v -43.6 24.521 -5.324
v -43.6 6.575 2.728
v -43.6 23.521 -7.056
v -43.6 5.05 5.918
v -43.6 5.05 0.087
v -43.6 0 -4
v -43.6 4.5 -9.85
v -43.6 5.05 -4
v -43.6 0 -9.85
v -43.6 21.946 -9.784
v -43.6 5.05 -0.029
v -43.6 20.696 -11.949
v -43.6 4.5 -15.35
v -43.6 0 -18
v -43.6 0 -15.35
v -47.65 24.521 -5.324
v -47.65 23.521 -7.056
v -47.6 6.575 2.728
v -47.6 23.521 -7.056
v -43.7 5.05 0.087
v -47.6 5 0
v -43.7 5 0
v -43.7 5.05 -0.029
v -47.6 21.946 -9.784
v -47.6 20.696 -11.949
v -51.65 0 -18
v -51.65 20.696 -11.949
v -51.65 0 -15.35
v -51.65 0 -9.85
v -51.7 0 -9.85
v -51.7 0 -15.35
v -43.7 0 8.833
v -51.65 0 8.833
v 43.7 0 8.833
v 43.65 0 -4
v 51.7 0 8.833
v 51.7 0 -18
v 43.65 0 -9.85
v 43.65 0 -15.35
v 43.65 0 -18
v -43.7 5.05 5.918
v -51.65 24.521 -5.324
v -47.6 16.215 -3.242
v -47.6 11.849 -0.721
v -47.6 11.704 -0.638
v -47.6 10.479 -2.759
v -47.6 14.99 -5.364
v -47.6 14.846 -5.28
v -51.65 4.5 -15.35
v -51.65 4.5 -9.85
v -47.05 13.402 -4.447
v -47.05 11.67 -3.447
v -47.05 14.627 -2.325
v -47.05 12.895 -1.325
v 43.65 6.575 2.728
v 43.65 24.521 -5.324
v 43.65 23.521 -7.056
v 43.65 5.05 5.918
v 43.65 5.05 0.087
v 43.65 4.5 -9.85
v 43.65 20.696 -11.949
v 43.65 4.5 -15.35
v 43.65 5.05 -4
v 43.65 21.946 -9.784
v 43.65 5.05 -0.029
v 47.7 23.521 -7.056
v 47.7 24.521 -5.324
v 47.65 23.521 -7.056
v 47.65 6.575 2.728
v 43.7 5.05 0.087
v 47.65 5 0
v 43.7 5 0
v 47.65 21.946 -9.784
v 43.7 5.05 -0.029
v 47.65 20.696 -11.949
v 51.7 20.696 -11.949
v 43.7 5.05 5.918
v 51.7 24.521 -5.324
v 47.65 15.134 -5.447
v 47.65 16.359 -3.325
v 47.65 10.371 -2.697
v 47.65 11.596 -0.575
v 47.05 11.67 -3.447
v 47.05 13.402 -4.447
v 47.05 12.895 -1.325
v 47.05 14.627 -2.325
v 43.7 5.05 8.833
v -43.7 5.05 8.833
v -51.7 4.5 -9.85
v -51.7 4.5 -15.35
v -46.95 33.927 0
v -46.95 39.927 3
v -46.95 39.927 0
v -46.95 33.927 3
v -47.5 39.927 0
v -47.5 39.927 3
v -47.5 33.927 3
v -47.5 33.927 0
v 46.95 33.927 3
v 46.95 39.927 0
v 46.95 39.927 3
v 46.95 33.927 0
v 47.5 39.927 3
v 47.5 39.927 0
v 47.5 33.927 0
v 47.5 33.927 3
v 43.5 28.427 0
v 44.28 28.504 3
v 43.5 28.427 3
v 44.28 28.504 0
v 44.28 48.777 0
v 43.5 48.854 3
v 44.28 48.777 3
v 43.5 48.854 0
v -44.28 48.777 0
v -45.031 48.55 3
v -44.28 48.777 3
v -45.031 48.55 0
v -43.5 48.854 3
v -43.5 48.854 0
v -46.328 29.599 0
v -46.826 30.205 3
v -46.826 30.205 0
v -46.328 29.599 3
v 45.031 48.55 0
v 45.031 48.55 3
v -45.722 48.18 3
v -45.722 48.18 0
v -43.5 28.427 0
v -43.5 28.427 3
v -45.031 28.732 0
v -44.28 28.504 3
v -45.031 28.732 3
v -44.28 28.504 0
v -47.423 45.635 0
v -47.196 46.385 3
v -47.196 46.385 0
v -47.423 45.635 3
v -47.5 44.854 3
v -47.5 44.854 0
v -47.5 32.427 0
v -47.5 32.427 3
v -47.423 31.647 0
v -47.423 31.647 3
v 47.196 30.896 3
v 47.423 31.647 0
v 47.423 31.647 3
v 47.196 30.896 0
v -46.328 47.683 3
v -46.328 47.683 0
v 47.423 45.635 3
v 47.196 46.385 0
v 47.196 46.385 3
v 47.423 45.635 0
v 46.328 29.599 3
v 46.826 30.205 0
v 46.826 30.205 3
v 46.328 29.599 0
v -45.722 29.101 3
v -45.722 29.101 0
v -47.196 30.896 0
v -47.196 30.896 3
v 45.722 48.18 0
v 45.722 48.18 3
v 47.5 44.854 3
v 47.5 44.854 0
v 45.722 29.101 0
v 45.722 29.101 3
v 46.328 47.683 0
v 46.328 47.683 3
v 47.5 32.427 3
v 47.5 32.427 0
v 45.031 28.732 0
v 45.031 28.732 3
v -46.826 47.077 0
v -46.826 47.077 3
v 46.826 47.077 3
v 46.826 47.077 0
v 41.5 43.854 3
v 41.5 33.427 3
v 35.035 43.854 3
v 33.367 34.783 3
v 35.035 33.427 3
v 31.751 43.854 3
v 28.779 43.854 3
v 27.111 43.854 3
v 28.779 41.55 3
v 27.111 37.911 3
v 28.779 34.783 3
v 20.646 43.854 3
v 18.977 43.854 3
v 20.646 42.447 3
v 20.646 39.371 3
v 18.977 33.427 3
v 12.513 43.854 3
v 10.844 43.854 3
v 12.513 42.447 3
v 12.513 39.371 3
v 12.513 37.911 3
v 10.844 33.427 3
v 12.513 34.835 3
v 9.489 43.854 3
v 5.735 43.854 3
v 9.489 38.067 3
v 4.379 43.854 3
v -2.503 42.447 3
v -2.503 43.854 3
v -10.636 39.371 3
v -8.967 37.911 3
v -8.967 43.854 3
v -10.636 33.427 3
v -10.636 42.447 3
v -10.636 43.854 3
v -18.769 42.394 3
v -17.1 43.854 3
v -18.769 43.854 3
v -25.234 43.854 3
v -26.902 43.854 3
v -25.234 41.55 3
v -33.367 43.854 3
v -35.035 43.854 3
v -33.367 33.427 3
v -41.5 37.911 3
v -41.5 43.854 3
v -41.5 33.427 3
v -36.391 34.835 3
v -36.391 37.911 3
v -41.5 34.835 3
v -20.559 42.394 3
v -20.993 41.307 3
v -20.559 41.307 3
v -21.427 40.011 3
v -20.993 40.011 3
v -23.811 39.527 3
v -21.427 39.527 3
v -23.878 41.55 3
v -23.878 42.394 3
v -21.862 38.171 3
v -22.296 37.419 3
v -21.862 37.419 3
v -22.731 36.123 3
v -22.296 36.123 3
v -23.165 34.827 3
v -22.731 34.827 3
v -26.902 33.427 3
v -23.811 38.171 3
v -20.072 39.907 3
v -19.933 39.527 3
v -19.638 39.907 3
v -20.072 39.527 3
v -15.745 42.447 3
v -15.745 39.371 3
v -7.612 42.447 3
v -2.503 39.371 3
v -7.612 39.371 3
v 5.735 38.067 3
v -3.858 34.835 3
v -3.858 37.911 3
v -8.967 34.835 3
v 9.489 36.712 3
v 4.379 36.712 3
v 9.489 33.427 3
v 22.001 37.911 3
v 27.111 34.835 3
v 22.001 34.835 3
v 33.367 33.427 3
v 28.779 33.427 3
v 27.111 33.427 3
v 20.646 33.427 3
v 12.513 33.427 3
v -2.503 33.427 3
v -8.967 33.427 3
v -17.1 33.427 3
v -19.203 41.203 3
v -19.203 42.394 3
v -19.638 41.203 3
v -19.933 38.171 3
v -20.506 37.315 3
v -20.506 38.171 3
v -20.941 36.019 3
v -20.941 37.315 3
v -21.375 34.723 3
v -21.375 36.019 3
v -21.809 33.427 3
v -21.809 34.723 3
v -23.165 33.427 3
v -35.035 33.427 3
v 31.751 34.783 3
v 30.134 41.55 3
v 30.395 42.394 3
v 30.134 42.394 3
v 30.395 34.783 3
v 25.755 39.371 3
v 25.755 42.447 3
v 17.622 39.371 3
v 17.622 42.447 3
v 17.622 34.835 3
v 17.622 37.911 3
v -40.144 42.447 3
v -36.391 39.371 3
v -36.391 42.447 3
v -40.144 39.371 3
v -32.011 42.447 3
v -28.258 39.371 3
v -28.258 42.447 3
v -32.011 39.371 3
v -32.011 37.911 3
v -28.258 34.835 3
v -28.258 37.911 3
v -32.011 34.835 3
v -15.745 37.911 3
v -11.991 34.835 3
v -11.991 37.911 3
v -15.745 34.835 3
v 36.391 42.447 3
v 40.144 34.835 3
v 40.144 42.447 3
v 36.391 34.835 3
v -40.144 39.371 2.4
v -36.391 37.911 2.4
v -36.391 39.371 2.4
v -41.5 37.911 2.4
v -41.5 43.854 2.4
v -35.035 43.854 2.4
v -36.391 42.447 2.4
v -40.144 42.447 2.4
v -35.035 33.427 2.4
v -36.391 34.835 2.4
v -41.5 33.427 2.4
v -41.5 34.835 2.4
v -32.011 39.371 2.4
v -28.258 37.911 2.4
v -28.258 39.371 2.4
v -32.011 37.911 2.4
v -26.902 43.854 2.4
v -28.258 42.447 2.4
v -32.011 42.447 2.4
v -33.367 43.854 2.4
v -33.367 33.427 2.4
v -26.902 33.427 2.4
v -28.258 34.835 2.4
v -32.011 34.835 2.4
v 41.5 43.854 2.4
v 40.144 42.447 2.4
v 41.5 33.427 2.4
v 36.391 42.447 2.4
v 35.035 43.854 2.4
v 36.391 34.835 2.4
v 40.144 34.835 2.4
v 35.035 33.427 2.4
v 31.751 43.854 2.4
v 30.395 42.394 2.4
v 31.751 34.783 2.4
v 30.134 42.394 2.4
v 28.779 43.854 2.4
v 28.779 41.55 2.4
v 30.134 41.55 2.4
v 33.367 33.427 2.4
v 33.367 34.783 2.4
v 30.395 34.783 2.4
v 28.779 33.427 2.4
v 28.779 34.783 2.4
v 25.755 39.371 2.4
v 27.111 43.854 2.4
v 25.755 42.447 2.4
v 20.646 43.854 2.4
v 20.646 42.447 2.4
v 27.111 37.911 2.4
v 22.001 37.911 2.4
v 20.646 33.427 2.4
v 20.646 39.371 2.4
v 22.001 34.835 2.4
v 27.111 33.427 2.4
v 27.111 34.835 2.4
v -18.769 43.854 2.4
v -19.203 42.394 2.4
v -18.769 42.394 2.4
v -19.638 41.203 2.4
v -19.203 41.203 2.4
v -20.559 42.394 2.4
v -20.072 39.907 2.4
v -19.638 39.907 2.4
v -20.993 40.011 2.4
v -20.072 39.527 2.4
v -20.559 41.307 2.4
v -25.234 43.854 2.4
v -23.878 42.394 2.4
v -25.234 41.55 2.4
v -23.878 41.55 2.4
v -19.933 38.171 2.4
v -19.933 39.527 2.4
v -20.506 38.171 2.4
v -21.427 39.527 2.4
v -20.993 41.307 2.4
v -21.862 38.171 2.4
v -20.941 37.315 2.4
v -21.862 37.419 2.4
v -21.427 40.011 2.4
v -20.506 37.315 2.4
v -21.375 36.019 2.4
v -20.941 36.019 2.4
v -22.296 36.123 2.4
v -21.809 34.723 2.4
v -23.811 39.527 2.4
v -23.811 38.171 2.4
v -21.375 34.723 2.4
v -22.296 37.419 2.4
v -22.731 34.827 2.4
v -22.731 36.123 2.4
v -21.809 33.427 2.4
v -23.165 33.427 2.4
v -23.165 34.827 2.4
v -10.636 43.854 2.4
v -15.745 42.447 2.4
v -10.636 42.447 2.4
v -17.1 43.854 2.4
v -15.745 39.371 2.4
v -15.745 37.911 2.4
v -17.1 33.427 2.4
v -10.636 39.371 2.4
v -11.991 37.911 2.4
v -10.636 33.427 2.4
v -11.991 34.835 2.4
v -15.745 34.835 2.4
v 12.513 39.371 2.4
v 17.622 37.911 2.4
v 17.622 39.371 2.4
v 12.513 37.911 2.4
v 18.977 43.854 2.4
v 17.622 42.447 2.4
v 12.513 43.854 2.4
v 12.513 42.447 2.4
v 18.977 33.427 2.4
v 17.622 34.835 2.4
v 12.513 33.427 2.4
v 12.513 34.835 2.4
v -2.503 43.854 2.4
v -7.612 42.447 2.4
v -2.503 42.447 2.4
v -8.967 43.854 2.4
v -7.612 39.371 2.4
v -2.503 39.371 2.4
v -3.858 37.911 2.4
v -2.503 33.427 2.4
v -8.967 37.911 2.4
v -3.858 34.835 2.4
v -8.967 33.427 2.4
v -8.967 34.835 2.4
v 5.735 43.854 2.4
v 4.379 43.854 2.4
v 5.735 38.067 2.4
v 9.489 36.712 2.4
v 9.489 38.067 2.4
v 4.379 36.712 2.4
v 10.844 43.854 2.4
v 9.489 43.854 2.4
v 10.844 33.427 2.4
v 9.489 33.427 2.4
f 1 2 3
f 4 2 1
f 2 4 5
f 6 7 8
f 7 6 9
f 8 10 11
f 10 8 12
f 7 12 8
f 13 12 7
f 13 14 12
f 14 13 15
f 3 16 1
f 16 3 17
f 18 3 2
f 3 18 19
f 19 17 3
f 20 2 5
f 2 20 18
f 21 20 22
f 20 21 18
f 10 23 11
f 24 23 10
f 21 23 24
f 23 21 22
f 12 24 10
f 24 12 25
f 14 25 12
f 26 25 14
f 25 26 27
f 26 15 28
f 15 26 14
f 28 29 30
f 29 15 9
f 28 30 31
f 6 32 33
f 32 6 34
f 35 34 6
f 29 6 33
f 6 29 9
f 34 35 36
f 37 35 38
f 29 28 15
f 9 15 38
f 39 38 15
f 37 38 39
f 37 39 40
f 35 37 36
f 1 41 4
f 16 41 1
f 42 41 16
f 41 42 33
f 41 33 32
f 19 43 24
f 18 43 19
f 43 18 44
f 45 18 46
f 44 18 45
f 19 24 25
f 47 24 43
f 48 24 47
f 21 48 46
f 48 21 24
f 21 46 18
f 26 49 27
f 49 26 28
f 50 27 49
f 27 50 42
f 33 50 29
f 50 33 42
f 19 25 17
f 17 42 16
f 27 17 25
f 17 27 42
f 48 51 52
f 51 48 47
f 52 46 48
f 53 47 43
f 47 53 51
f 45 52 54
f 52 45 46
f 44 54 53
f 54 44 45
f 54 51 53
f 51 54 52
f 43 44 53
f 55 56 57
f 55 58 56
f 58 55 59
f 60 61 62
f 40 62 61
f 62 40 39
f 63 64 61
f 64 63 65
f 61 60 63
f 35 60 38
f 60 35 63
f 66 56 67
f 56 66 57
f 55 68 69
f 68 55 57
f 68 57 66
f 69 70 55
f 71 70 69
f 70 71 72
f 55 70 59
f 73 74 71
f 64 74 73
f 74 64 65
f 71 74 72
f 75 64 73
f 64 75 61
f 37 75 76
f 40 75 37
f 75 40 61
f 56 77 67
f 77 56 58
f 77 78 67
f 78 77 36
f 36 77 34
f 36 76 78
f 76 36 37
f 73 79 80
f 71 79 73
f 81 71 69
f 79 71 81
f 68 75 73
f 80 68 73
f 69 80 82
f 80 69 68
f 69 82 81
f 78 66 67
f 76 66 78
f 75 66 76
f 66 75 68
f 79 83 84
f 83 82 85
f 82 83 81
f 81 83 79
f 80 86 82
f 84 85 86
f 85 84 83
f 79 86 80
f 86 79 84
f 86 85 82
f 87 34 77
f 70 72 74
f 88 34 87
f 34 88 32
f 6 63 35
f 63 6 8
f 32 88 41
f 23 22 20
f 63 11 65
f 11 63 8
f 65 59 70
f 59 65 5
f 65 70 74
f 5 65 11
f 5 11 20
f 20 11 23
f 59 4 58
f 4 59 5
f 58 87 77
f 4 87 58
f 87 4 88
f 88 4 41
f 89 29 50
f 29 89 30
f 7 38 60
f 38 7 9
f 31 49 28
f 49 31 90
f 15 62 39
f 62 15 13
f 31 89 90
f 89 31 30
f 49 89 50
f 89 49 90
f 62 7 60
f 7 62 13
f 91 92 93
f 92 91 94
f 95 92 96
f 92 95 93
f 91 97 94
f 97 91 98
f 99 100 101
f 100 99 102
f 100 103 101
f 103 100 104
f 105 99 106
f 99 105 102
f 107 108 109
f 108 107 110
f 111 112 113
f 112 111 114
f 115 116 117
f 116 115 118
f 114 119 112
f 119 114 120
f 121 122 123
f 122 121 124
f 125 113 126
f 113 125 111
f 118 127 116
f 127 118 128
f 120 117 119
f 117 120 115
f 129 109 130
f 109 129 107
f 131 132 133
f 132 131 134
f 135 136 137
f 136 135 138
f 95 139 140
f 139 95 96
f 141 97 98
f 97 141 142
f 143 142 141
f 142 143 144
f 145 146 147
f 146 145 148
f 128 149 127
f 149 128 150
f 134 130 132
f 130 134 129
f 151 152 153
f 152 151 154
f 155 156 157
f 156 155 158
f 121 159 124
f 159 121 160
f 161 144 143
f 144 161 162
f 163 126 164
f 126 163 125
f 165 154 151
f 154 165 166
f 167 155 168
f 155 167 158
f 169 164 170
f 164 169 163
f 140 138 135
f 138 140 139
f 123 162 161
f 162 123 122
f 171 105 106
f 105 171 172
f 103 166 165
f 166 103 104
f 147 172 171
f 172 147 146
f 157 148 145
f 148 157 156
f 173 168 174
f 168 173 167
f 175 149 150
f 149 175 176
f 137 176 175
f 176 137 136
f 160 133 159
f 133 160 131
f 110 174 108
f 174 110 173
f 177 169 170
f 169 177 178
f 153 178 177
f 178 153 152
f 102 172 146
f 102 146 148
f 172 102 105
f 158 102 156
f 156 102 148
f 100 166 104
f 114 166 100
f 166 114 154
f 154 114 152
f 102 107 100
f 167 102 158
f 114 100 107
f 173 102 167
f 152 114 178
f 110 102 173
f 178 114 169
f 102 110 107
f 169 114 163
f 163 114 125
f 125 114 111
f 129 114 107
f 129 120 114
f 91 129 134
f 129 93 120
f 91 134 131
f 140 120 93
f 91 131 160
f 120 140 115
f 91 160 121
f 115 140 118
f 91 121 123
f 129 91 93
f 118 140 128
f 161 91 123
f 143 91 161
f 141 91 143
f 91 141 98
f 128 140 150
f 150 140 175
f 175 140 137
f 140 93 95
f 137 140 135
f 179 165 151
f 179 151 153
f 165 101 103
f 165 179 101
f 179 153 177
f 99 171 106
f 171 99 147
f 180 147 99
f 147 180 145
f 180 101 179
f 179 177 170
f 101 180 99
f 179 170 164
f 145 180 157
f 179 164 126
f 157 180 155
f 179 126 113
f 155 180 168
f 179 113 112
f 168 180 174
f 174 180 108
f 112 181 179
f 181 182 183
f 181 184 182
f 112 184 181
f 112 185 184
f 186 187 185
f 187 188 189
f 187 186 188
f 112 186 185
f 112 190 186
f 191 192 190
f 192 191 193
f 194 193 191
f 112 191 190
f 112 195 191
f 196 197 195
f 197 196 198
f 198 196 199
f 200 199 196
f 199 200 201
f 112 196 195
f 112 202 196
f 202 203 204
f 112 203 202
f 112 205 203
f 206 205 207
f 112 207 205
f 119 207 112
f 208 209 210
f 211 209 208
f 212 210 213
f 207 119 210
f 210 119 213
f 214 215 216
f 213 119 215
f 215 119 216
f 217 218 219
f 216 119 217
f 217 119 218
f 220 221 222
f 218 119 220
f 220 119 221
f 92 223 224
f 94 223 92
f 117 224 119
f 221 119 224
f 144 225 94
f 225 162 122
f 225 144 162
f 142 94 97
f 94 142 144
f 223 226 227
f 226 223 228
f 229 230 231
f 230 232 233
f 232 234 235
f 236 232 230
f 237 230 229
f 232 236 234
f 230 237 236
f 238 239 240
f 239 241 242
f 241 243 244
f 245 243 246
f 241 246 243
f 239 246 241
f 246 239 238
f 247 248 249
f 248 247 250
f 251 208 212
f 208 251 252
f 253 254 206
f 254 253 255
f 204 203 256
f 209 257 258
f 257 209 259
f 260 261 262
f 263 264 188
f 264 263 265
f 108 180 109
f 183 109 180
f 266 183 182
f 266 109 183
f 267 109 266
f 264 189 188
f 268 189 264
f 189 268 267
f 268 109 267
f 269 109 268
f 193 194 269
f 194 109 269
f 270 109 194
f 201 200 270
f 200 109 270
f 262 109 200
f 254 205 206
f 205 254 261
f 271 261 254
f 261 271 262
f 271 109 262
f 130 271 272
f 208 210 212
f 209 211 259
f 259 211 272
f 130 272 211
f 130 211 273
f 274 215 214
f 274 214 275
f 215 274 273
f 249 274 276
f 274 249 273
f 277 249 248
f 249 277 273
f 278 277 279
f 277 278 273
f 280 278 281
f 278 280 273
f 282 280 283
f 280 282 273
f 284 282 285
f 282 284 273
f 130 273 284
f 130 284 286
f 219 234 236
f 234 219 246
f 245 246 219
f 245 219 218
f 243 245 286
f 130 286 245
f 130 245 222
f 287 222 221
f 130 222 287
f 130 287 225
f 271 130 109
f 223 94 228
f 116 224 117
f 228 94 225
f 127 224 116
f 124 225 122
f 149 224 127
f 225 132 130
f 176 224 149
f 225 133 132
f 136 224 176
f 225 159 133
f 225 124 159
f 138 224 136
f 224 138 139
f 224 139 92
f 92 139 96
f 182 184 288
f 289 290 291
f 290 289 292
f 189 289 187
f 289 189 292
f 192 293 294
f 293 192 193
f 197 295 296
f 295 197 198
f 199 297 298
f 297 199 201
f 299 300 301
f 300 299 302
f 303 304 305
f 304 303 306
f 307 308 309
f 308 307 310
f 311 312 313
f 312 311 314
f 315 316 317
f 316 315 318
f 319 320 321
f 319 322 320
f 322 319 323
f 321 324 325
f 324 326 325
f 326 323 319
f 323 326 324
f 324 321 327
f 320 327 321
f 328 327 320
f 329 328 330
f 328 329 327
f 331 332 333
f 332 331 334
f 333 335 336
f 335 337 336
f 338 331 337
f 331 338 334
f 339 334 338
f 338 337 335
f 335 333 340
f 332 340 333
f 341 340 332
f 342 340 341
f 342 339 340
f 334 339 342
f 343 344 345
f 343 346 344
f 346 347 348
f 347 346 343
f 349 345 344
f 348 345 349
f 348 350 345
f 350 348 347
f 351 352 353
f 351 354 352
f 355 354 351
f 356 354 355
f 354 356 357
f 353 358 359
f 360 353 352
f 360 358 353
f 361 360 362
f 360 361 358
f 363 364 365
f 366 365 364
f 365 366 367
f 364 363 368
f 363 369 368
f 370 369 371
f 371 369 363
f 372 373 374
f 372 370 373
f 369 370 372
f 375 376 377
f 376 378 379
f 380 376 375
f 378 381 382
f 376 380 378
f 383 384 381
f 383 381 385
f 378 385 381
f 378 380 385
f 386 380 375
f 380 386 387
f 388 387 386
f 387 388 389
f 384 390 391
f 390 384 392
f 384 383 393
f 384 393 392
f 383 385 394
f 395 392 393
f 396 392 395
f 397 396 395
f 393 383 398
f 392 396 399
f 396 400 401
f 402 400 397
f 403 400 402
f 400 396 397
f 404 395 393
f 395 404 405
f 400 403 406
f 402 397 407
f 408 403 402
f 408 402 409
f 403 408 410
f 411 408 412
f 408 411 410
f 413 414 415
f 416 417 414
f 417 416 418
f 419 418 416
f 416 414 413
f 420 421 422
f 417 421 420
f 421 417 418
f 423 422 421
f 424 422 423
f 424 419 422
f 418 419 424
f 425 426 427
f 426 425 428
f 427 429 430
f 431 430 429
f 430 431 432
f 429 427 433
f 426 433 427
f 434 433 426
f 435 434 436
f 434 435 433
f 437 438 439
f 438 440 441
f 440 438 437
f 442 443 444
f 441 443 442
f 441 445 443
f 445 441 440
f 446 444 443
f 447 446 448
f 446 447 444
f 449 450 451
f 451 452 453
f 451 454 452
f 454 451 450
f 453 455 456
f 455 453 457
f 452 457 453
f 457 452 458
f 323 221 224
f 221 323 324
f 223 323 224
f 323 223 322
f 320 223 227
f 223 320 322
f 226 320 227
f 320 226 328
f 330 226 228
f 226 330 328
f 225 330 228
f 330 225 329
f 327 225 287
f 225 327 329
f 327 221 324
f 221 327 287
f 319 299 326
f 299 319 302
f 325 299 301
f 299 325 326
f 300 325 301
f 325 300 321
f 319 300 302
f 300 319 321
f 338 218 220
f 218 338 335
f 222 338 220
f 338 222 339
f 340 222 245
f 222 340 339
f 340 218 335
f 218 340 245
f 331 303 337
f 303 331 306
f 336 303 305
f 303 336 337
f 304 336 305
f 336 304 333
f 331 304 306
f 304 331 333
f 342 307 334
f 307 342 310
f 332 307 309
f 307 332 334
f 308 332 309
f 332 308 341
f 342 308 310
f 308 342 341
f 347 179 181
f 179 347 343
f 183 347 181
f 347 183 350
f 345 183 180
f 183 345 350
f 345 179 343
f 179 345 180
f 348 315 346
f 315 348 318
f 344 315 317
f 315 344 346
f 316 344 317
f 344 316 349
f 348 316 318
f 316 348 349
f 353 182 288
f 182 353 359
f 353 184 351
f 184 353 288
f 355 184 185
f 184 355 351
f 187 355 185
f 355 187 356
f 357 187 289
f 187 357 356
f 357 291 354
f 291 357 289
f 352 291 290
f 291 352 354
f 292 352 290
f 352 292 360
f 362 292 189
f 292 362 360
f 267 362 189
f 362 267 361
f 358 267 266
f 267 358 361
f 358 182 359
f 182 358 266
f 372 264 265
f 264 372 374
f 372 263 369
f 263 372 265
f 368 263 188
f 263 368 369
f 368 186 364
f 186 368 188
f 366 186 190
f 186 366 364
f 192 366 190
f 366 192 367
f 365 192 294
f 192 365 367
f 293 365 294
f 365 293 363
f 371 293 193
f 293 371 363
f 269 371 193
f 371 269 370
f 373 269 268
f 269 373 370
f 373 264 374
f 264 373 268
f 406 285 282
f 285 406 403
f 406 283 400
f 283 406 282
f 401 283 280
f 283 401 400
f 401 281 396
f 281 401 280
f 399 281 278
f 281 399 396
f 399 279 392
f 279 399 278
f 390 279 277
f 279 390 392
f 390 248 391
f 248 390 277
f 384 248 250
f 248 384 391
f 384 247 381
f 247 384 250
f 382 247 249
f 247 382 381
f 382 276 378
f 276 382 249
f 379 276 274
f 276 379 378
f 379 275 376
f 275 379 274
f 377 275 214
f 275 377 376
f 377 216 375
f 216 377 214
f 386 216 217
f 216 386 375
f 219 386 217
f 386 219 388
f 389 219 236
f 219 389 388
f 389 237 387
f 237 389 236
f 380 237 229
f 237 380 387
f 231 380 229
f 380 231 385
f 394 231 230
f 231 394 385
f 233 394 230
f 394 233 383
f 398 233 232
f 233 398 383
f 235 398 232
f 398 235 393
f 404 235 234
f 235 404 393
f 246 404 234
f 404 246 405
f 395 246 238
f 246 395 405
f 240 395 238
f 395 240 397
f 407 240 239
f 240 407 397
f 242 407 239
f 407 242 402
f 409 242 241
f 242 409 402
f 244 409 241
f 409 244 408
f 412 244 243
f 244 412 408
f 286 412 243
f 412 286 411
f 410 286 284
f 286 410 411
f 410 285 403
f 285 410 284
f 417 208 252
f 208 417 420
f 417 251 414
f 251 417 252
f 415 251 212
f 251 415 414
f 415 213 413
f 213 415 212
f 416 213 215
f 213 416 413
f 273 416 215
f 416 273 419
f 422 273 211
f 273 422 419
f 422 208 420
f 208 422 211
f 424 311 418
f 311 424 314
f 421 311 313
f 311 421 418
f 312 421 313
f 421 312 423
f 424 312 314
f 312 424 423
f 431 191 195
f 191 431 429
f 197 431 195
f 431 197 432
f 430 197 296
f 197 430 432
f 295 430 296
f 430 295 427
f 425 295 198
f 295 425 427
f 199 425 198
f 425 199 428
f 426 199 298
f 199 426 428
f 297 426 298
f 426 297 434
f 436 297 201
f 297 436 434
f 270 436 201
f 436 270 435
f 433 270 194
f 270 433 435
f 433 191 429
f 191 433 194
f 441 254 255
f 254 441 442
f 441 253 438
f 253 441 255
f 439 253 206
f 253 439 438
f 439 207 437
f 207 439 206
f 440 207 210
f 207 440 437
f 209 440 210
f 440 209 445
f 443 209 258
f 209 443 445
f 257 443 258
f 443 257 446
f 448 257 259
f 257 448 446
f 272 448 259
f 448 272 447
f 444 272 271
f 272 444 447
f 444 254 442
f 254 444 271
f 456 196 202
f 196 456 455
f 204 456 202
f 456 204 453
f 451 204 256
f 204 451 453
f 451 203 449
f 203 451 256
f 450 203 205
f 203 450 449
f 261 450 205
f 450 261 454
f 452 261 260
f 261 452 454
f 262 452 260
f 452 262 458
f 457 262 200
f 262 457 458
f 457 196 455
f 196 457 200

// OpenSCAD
// =============================================================================
//  Plate Forge — car parking number plate
//  Single colour, single sided, engraved digits, single-piece grooved wedge stand.
//  Tuned for a Bambu Lab A1 mini (180 × 180 × 180).
//
//  MakerWorld Parametric Model Maker ready:
//    · Customizer-style top level parameters with dropdowns
//    · mw_plate_1() for the printable output
//    · mw_assembly_view() for the assembled preview
//
//  Print the panel back-face-down, number face up, ironing ON ("All top
//  surfaces"). Print the stand standing on its base — no supports either way.
// =============================================================================

/* [The number] */

// Digits, space, + - . only. Up to 14 characters.
number = "98765 43210";

// What to generate on the plate
mode = "both"; // [both:Panel + stand, panel:Panel only, rack:Stand only, coupon:Pen test coupon]

/* [Panel] */

// Target length of the plate in mm (70-100 mm is sweet spot for car dashboards)
plate_length = 95; // [60:5:160]

panel_thickness = 3.0; // [1.6:0.2:4.5]
corner_radius = 4; // [0:0.5:14]
side_gap = 6; // [2:1:26]
end_gap = 5; // [2:1:22]

/* [Digit relief] */

// Engraved = pen sits in the groove. Raised = wipe a pen across the tops.
lettering = "engraved"; // [engraved:Engraved, raised:Raised]

// How deep the groove is / how high the ridge is
relief_depth = 0.6; // [0.3:0.1:1.2]

// Maximum digit cap height
digit_height = 18; // [12:0.5:36]

// Stroke thickness as a fraction of digit height. 0.13 ≈ 2.3 mm at 18 mm digits.
stroke_ratio = 0.13; // [0.10:0.01:0.22]

// Space between segments, fraction of digit height
segment_gap = 0.025; // [0.015:0.005:0.06]

// Space between characters, fraction of digit height
tracking = 0.16; // [0.04:0.01:0.34]

/* [Stand] */

// Rake from vertical. 30° lines up with a modern windscreen.
rake_deg = 30; // [0:1:45]
easel_fin = 4; // [3:0.5:6]
easel_clearance = 0.4;
easel_lip = 8; // [4:1:14]

with_rack = (mode == "both" || mode == "rack");

/* [Hidden] */

$fn = 48;
max_panel_width = 160;
plate_gap = 8;
EPS = 0.01;

// ---------------------------------------------------------------------------
//  Glyph metrics. Everything is in cap-height units: y spans 0..1.
// ---------------------------------------------------------------------------

aspect = 0.62; // digit cell width
narrow = 0.44; // cell width for "1"

// 7-segment membership per digit
SEGS = ["ABCDEF", "BC", "ABGED", "ABGCD", "FGBC", "AFGCD", "AFGECD", "ABC", "ABCDEFG", "ABCDFG"];

function is_digit(ch) =
    let (k = search(ch, "0123456789"))
    len(k) == 0 ? false : (k[0] < 0 ? false : true);

function digit_of(ch) =
    let (k = search(ch, "0123456789"))
    len(k) == 0 ? -1 : k[0];

function char_advance(ch) =
    ch == " " ? 0.34 :
    ch == "+" ? 0.72 :
    ch == "-" ? 0.66 :
    ch == "." ? 0.34 :
    ch == "1" ? narrow :
    aspect;

function advance_sum(s, i = 0, acc = 0) =
    i >= len(s) ? acc : advance_sum(s, i + 1, acc + char_advance(s[i]));

function text_width(s) = advance_sum(s) + tracking * max(0, len(s) - 1);

function offsets(s, i = 0, acc = 0, out = []) =
    i >= len(s) ? out :
    offsets(s, i + 1, acc + char_advance(s[i]) + tracking, concat(out, [acc]));

function fitted_height() =
    let (tw = text_width(number))
    let (scale = min(1, (plate_length - 2 * side_gap) / (tw * digit_height)))
    max(7, min(digit_height, (plate_length - 2 * side_gap) / tw));

function panel_width(s, h) = plate_length;
function panel_height(h) = max(18, h + 2 * end_gap);

// ---------------------------------------------------------------------------
//  Glyphs
// ---------------------------------------------------------------------------

module bar(r, h) {
    translate([r[0] * h, r[1] * h])
        square([(r[2] - r[0]) * h, (r[3] - r[1]) * h]);
}

/**
 * Solid sans-serif typography with continuous strokes, proper 1, 4, and 7.
 */
module digit_glyph(d, h, s, g) {
    cell = d == 1 ? narrow : aspect;
    top = 1 - s;
    mid = 0.5 - s / 2;

    if (d == 1) {
        // Solid classic sans-serif 1: stem, hook with barb, wide base serif
        xc = cell / 2;
        stemL = xc - s / 2;
        stemR = xc + s / 2;
        hookL = max(0, stemL - 1.2 * s);
        bar([stemL, 0, stemR, 1], h);
        bar([hookL, top - 0.01, stemR, 1], h);
        bar([hookL, top - 0.7 * s, hookL + s, top], h);
        bar([0, 0, cell, s], h);
    } else if (d == 4) {
        // True sans-serif 4: continuous full-height stem, continuous crossbar, upper left arm
        rightStemL = cell - s;
        midY = 0.38 - s / 2;
        bar([rightStemL, 0, cell, 1], h);
        bar([0, midY, cell, midY + s], h);
        bar([0, midY, s, 1], h);
    } else if (d == 7) {
        // Banking / Indian 7: top bar, downward hook, diagonal stepped stem, middle crossbar
        bar([0, top - 0.01, cell, 1], h);
        bar([0, top - 0.7 * s, s, top], h);
        steps = 7;
        botX = cell * 0.32;
        topX = cell - s;
        for (k = [0:steps-1]) {
            t0 = k / steps;
            t1 = (k + 1) / steps;
            y0 = t0 * top;
            y1 = min(top + 0.01, t1 * top + 0.01);
            x0 = botX * (1 - t0) + topX * t0;
            bar([x0, y0, x0 + s, y1], h);
        }
        midY = 0.52 - s / 2;
        bar([cell * 0.22, midY, cell * 0.82, midY + s], h);
    } else {
        set = SEGS[d];
        has = function(k) len(search(k, set)) > 0;
        if (has("A")) bar([0, top - 0.005, cell, 1], h);
        if (has("D")) bar([0, 0, cell, s + 0.005], h);
        if (has("G")) bar([0, mid - 0.005, cell, mid + s + 0.005], h);
        if (has("F") && has("E")) bar([0, 0, s, 1], h);
        else if (has("F")) bar([0, mid, s, 1], h);
        else if (has("E")) bar([0, 0, s, mid + s], h);
        if (has("B") && has("C")) bar([cell - s, 0, cell, 1], h);
        else if (has("B")) bar([cell - s, mid, cell, 1], h);
        else if (has("C")) bar([cell - s, 0, cell, mid + s], h);
    }
}

/** One non-digit character. */
module symbol_glyph(ch, h, s, g) {
    if (ch == "+") {
        bar([0.30, 0.06, 0.30 + s, 0.94], h);
        bar([0.02, 0.44 - s / 2, 0.30 - g / 2, 0.44 + s / 2], h);
        bar([0.30 + s + g / 2, 0.44 - s / 2, 0.62, 0.44 + s / 2], h);
    } else if (ch == "-") {
        bar([0.04, 0.44 - s / 2, 0.46, 0.44 + s / 2], h);
    } else if (ch == ".") {
        square([0.18 * h, 0.18 * h]);
    }
}

/** The whole string, centred on x = 0, sitting on y = 0. */
module number_2d(s, h) {
    s_ratio = max(0.10, min(0.22, stroke_ratio));
    g = max(0.015, min(0.06, segment_gap));
    offs = offsets(s);
    tw = text_width(s);
    for (i = [0:len(s) - 1]) {
        ch = s[i];
        translate([(offs[i] - tw / 2) * h, 0]) {
            if (is_digit(ch))
                digit_glyph(digit_of(ch), h, s_ratio, g);
            else
                symbol_glyph(ch, h, s_ratio, g);
        }
    }
}

// ---------------------------------------------------------------------------
//  Panel
// ---------------------------------------------------------------------------

module rounded_rect(w, h, r) {
    rr = max(0, min(r, min(w, h) / 2 - 0.2));
    translate([rr, rr])
        offset(r = rr, $fn = 32)
            square([w - 2 * rr, h - 2 * rr]);
}

/**
 * The number panel. Origin at bottom-center of the back face, z = 0 on build plate.
 */
module panel(str = number, h = -1, thick = panel_thickness, rad = corner_radius) {
    hh = h < 0 ? fitted_height() : h;
    w = panel_width(str, hh);
    hp = panel_height(hh);
    rel = max(0.2, min(1.4, relief_depth));

    translate([-w / 2, 0, 0]) union() {
        difference() {
            linear_extrude(height = thick)
                rounded_rect(w, hp, rad);

            // Dual side keying notches for snap fit with stand keys
            if (with_rack) {
                translate([-1, 5.5, -1])
                    cube([0.55 + 1, 6, thick + 2]);
                translate([w - 0.55, 5.5, -1])
                    cube([0.55 + 1, 6, thick + 2]);
            }

            if (lettering == "engraved")
                translate([w / 2, end_gap, thick - rel])
                    linear_extrude(height = rel + 1)
                        number_2d(str, hh);
        }

        if (lettering == "raised")
            translate([w / 2, end_gap, thick - EPS])
                linear_extrude(height = rel + EPS)
                    number_2d(str, hh);
    }
}

// ---------------------------------------------------------------------------
//  Stand (Single-piece grooved wedge mount)
// ---------------------------------------------------------------------------

function lip_height() = min(easel_lip, max(5, panel_height(fitted_height()) * 0.22));

/**
 * Single-piece grooved wedge stand with monolithic grounded channels and dual side keying.
 */
module stand() {
    hh = fitted_height();
    pw = panel_width(number, hh);
    ph = panel_height(hh);
    th = panel_thickness;
    base = lip_height();

    clSide = 0.15;
    clThick = 0.15;
    slotW = th + clThick;
    frontLipT = 2.0;
    v_front = slotW + frontLipT;
    backFlangeT = 2.5;
    slotDepth = 4.0;
    wallThick = 4.0;

    x_slot_outer = pw / 2 + clSide;
    x_slot_inner = x_slot_outer - slotDepth;
    x_stand_outer = x_slot_outer + wallThick;

    cosr = cos(rake_deg);
    sinr = sin(rake_deg);
    hb = max(8, ph * 0.86);
    rear = max(18, min(46, ph * 0.62));
    chLen = hb + 2.0;

    function Y(u, v) = base + u * cosr + v * sinr;
    function Z(u, v) = -u * sinr + v * cosr;

    u_toe = -(base + v_front * sinr) / cosr;
    Z_toe = Z(u_toe, v_front);

    // 8-point 2D channel profile in [Z, Y]
    chPoints = [
        [-rear, 0],
        [Z_toe, 0],
        [Z(chLen, v_front), Y(chLen, v_front)],
        [Z(chLen, slotW), Y(chLen, slotW)],
        [Z(0, slotW), Y(0, slotW)],
        [Z(0, 0), Y(0, 0)],
        [Z(chLen, 0), Y(chLen, 0)],
        [Z(chLen, -backFlangeT), Y(chLen, -backFlangeT)]
    ];

    // 4-point 2D outer wall profile in [Z, Y]
    outPoints = [
        [-rear, 0],
        [Z_toe, 0],
        [Z(chLen, v_front), Y(chLen, v_front)],
        [Z(chLen, -backFlangeT), Y(chLen, -backFlangeT)]
    ];

    // Left and right side uprights
    for (sgn = [-1, 1]) {
        // Channel solid with slot recessed from top
        chX = sgn > 0 ? x_slot_outer + 0.05 : -x_slot_inner + 0.05;
        translate([chX, 0, 0])
            rotate([0, -90, 0])
                linear_extrude(height = slotDepth + 0.05)
                    polygon(points = chPoints);

        // Outer wall solid covering channel from the outside
        outX = sgn > 0 ? x_stand_outer + 0.05 : -x_slot_outer + 0.05;
        translate([outX, 0, 0])
            rotate([0, -90, 0])
                linear_extrude(height = wallThick + 0.05)
                    polygon(points = outPoints);

        // Dual side key bumps inside the channel (ramped detents with 0.10 mm snug clearance)
        keyH = 0.60;
        keyDepth = slotW - 0.70;
        translate([sgn * x_slot_outer, base, 0])
            rotate([-rake_deg, 0, 0])
                translate([0, 0, 0.35])
                    linear_extrude(height = keyDepth)
                        polygon(points = [
                            [0, 6.0],
                            [-sgn * keyH, 7.5],
                            [-sgn * keyH, 9.5],
                            [0, 11.5]
                        ]);
    }

    // Front plinth bridge (monolithic base sitting flat on bed connecting left & right uprights)
    bridgeW = 2 * (x_slot_inner + 0.05);
    bridgeD = Z_toe - (-4.0);
    translate([-bridgeW / 2, 0, -4.0])
        cube([bridgeW, base + 0.05, bridgeD]);

    // Rear tie bar connecting rear feet on the bed
    totalW = 2 * (x_stand_outer + 0.05);
    translate([-totalW / 2, 0, -rear * 0.7 - 2.75])
        cube([totalW, 4.5, 5.5]);
}

module rack() {
    stand();
}

/** The stand as it prints: sitting flat on its base on the bed. */
module rack_on_bed() {
    stand();
}

/** Panel seated in the stand: it drops into the channels. */
module assembly() {
    base = lip_height();
    stand();
    translate([0, base, 0])
        rotate([-rake_deg, 0, 0])
            panel();
}

// ---------------------------------------------------------------------------
//  Pen test coupon
// ---------------------------------------------------------------------------

module coupon_tile(lg, rd) {
    difference() {
        linear_extrude(height = 2.4)
            rounded_rect(24, 23, 2);
        if (lg == "engraved")
            translate([12, 4, 2.4 - rd])
                linear_extrude(height = rd + 1)
                    digit_glyph(8, 15, max(0.10, min(0.22, stroke_ratio)),
                                max(0.015, min(0.06, segment_gap)));
    }
    if (lg == "raised")
        translate([12, 4, 2.4 - EPS])
            linear_extrude(height = rd + EPS)
                digit_glyph(8, 15, max(0.10, min(0.22, stroke_ratio)),
                            max(0.015, min(0.06, segment_gap)));
}

module coupon() {
    tiles = [for (lg = ["engraved", "raised"]) for (rd = [0.4, 0.6, 0.9]) [lg, rd]];
    n = len(tiles);
    tw = 24;
    gap = 4;
    total = n * tw + (n - 1) * gap;
    for (i = [0:n - 1])
        translate([i * (tw + gap) - total / 2, 0, 0])
            coupon_tile(tiles[i][0], tiles[i][1]);
}

// ---------------------------------------------------------------------------
//  Output
// ---------------------------------------------------------------------------

module plate_contents() {
    hh = fitted_height();
    pw = panel_width(number, hh);
    ph = panel_height(hh);

    if (mode == "panel") {
        panel();
    } else if (mode == "rack") {
        stand();
    } else if (mode == "coupon") {
        coupon();
    } else {
        // Both: stand on bed, panel beside it
        stand();
        translate([0, ph + 8, 0]) panel();
    }
}

module mw_plate_1() {
    plate_contents();
}

module mw_assembly_view() {
    assembly();
}

mw_plate_1();
